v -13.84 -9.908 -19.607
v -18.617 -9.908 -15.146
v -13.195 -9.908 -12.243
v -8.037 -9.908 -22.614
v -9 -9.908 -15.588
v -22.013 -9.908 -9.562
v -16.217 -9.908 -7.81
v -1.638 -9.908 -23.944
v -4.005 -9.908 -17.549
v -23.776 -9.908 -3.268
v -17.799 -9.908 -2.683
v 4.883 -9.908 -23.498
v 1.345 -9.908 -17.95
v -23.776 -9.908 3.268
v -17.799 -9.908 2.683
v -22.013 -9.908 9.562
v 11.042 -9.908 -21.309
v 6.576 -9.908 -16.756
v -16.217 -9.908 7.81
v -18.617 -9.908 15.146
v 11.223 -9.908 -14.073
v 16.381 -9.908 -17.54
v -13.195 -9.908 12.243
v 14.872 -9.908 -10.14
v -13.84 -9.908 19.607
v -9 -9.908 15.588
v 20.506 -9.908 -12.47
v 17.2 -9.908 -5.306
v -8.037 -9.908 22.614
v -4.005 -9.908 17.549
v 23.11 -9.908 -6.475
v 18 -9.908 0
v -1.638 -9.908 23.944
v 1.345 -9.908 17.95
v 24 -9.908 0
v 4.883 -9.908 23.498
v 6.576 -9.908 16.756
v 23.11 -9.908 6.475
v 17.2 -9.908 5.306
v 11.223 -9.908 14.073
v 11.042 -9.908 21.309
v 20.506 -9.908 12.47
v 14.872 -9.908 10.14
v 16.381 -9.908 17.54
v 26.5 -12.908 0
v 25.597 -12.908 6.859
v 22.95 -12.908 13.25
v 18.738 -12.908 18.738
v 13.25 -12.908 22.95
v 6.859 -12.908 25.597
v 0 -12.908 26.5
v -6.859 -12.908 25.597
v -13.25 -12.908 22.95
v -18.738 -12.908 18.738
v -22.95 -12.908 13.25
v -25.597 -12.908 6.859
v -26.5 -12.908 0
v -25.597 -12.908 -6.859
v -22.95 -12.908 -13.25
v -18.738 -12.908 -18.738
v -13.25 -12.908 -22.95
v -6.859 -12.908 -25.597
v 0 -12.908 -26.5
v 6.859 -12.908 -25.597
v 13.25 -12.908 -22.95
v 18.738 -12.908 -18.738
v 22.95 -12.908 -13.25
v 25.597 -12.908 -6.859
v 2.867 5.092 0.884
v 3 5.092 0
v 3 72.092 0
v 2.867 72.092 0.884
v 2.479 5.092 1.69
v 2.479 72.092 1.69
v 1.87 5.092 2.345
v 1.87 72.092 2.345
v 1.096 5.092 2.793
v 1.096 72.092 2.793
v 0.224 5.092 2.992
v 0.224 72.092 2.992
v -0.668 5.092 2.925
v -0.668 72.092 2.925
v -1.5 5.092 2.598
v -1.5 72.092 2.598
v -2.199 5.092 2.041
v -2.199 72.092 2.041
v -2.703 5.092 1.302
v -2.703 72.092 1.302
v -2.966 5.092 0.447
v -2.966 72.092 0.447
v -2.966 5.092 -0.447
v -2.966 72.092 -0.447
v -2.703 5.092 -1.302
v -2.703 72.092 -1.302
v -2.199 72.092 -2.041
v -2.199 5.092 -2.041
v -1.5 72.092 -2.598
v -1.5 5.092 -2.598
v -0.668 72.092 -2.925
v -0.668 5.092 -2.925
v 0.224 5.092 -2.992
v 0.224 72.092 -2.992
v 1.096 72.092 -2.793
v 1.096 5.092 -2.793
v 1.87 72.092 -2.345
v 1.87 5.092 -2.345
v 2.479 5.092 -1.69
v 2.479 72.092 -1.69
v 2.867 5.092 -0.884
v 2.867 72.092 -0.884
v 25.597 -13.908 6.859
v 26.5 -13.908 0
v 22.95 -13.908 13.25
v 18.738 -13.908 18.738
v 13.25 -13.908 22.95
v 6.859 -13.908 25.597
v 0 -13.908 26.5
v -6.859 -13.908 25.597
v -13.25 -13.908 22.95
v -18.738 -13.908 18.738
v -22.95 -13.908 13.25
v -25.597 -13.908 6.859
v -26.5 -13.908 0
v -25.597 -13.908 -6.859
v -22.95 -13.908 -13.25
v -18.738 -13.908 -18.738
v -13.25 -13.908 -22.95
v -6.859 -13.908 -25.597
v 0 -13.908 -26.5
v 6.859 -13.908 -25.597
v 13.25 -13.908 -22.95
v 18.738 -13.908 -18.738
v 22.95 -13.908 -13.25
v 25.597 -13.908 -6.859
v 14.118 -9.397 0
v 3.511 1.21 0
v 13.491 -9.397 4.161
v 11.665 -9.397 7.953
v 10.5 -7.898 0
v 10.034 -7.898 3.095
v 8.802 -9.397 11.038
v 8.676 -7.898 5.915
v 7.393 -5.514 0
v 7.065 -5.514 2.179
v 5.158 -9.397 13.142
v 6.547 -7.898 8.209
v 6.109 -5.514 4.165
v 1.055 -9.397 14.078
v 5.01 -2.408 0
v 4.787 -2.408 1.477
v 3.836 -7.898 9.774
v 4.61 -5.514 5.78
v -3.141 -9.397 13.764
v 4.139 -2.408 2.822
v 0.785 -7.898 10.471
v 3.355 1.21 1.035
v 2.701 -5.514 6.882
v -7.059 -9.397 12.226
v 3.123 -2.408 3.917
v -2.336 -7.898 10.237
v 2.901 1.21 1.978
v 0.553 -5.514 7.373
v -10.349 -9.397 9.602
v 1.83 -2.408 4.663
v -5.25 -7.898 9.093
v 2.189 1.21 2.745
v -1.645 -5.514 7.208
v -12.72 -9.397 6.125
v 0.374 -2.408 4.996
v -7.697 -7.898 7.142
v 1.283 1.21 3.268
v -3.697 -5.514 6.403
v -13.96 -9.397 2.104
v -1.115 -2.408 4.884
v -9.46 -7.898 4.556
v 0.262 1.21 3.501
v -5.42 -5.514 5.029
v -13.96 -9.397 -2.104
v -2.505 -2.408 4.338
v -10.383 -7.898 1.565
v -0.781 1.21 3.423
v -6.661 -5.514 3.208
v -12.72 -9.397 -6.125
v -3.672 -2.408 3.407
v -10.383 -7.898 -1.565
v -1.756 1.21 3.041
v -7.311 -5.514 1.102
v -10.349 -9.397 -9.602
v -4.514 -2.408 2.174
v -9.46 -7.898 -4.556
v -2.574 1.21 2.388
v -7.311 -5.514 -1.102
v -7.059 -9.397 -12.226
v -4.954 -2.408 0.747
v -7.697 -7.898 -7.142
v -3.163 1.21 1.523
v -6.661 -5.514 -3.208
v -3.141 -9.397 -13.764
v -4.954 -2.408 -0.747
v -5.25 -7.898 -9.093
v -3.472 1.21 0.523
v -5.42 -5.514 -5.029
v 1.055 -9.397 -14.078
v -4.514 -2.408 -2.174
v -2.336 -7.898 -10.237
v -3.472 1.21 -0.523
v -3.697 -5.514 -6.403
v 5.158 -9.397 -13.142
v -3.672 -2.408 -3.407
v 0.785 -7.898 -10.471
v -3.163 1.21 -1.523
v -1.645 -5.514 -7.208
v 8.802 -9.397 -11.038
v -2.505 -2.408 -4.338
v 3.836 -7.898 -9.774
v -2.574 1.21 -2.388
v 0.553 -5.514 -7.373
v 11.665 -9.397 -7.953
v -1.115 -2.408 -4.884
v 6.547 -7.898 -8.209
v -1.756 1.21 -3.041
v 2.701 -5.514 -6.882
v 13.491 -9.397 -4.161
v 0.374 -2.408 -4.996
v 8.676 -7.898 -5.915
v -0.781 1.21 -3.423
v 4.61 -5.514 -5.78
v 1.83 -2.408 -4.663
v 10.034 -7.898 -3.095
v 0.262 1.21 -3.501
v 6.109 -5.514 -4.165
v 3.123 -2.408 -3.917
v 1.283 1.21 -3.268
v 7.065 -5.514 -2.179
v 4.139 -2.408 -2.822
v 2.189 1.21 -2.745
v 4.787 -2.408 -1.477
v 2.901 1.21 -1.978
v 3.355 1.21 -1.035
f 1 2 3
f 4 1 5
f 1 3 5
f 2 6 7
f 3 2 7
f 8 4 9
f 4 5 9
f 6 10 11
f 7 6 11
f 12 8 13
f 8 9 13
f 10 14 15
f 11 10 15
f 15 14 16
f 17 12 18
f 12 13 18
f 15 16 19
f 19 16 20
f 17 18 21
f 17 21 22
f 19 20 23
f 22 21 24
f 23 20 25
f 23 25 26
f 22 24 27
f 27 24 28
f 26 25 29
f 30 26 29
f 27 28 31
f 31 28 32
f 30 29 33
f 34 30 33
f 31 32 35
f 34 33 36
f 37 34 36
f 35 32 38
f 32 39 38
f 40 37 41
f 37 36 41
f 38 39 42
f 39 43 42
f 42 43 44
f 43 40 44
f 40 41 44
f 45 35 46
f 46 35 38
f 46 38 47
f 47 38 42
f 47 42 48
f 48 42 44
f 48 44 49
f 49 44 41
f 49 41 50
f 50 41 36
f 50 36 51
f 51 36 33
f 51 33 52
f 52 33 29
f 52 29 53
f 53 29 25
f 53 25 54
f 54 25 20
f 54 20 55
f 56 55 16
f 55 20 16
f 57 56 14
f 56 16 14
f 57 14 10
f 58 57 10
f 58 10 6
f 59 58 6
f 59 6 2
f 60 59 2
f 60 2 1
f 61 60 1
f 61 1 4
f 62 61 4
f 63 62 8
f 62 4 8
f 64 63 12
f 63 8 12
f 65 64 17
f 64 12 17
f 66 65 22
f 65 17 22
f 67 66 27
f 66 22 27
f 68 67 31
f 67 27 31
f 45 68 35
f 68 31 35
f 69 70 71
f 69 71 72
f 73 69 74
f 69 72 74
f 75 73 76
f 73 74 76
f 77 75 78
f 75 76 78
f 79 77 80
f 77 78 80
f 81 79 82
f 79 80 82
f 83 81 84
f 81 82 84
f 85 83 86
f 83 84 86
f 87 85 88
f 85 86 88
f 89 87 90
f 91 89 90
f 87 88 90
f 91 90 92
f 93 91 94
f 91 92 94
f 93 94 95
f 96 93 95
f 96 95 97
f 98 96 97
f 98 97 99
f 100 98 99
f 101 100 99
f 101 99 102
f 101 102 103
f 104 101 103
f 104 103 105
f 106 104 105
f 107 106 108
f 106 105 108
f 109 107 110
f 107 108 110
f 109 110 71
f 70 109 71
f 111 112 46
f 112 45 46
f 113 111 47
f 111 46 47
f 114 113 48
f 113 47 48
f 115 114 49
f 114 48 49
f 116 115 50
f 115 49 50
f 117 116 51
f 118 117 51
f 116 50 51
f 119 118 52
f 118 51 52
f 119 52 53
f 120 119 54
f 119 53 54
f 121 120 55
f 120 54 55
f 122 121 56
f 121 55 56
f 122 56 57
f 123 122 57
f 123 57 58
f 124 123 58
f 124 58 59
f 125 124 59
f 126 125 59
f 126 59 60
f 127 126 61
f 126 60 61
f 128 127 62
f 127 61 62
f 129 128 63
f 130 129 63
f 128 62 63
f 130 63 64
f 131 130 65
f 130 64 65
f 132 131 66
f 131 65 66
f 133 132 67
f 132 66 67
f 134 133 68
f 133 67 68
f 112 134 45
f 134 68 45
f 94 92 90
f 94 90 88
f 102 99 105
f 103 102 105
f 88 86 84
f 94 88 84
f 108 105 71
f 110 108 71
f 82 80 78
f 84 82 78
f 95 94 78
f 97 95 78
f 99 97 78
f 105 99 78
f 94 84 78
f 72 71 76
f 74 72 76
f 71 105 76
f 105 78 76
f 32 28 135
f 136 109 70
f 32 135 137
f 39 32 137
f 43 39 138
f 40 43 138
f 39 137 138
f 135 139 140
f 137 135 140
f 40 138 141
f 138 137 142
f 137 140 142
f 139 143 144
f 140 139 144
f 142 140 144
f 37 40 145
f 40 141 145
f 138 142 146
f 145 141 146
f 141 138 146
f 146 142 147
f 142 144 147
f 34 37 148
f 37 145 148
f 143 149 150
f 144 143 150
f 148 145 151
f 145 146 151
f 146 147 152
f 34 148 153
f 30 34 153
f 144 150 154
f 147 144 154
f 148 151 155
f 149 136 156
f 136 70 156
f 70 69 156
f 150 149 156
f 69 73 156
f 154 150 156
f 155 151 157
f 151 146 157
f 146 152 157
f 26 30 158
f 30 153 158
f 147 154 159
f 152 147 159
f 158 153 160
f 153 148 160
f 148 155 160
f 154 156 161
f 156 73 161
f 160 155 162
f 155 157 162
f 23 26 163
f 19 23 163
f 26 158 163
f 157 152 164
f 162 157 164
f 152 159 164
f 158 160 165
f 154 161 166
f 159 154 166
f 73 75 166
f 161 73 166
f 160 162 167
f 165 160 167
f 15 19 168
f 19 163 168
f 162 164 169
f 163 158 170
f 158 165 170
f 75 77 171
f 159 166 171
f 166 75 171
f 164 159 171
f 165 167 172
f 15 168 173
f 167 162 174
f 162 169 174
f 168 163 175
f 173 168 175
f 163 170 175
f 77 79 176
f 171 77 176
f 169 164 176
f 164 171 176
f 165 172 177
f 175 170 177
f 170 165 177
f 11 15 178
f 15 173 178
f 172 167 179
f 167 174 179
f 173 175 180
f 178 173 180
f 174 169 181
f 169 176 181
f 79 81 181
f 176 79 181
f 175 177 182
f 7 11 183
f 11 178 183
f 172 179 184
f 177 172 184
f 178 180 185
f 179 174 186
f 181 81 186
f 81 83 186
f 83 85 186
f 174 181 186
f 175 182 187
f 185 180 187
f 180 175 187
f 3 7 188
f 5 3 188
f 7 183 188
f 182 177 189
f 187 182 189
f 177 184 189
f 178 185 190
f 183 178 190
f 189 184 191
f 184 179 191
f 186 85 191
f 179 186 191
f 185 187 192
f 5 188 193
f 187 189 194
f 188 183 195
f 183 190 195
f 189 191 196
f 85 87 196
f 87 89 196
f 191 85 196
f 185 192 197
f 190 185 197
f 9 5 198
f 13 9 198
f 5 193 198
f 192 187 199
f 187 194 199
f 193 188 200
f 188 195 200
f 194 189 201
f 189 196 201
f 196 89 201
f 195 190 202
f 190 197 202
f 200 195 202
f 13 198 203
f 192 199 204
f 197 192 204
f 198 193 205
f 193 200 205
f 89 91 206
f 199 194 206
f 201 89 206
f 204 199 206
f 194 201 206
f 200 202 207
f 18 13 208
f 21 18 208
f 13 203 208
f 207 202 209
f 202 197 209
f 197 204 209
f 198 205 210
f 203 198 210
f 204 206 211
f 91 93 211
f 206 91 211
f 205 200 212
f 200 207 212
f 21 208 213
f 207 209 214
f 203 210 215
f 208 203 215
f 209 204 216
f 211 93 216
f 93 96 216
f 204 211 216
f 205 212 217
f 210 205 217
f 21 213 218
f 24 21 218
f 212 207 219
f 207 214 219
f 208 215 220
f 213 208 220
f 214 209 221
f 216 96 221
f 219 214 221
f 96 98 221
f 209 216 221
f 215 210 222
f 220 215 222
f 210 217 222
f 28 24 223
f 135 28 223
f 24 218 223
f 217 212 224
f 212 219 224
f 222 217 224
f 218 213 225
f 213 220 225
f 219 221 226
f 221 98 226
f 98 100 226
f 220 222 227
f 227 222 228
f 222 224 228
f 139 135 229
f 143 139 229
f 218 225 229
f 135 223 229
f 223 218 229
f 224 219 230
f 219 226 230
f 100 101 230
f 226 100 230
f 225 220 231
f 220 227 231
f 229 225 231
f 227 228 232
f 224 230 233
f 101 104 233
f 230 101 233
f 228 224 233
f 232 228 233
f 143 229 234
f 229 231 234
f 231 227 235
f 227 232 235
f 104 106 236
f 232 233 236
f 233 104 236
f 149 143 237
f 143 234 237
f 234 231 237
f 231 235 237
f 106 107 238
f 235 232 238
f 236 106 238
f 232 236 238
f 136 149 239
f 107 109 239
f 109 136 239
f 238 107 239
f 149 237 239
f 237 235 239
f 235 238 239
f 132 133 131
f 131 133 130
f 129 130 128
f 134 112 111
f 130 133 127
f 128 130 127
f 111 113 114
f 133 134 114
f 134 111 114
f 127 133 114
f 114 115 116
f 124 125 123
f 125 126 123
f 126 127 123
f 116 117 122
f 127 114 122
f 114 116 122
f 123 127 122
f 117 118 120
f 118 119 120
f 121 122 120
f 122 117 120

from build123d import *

# Parameters (mm, degrees)
FILLET1_R = 15


with BuildPart() as part:
    # Sketch1 → Revolve1 (revolve)
    with BuildSketch(Plane.XY):
        Polygon((0, 72.092198582), (0, -13.907801418), (26.5, -13.907801418), (26.5, -12.907801418), (24, -9.907801418), (18, -9.907801418), (3, -9.907801418), (3, 5.092198582), (3, 72.092198582), align=None)
    revolve(axis=Axis((0, 72.092198582, 0), (0, -1, 0)))

    # Fillet1
    fillet1_edges = [part.edges().sort_by_distance(p)[0] for p in [
        (-3, -9.907801418, 0),
    ]]
    fillet(fillet1_edges, radius=FILLET1_R)


solid = part.part
